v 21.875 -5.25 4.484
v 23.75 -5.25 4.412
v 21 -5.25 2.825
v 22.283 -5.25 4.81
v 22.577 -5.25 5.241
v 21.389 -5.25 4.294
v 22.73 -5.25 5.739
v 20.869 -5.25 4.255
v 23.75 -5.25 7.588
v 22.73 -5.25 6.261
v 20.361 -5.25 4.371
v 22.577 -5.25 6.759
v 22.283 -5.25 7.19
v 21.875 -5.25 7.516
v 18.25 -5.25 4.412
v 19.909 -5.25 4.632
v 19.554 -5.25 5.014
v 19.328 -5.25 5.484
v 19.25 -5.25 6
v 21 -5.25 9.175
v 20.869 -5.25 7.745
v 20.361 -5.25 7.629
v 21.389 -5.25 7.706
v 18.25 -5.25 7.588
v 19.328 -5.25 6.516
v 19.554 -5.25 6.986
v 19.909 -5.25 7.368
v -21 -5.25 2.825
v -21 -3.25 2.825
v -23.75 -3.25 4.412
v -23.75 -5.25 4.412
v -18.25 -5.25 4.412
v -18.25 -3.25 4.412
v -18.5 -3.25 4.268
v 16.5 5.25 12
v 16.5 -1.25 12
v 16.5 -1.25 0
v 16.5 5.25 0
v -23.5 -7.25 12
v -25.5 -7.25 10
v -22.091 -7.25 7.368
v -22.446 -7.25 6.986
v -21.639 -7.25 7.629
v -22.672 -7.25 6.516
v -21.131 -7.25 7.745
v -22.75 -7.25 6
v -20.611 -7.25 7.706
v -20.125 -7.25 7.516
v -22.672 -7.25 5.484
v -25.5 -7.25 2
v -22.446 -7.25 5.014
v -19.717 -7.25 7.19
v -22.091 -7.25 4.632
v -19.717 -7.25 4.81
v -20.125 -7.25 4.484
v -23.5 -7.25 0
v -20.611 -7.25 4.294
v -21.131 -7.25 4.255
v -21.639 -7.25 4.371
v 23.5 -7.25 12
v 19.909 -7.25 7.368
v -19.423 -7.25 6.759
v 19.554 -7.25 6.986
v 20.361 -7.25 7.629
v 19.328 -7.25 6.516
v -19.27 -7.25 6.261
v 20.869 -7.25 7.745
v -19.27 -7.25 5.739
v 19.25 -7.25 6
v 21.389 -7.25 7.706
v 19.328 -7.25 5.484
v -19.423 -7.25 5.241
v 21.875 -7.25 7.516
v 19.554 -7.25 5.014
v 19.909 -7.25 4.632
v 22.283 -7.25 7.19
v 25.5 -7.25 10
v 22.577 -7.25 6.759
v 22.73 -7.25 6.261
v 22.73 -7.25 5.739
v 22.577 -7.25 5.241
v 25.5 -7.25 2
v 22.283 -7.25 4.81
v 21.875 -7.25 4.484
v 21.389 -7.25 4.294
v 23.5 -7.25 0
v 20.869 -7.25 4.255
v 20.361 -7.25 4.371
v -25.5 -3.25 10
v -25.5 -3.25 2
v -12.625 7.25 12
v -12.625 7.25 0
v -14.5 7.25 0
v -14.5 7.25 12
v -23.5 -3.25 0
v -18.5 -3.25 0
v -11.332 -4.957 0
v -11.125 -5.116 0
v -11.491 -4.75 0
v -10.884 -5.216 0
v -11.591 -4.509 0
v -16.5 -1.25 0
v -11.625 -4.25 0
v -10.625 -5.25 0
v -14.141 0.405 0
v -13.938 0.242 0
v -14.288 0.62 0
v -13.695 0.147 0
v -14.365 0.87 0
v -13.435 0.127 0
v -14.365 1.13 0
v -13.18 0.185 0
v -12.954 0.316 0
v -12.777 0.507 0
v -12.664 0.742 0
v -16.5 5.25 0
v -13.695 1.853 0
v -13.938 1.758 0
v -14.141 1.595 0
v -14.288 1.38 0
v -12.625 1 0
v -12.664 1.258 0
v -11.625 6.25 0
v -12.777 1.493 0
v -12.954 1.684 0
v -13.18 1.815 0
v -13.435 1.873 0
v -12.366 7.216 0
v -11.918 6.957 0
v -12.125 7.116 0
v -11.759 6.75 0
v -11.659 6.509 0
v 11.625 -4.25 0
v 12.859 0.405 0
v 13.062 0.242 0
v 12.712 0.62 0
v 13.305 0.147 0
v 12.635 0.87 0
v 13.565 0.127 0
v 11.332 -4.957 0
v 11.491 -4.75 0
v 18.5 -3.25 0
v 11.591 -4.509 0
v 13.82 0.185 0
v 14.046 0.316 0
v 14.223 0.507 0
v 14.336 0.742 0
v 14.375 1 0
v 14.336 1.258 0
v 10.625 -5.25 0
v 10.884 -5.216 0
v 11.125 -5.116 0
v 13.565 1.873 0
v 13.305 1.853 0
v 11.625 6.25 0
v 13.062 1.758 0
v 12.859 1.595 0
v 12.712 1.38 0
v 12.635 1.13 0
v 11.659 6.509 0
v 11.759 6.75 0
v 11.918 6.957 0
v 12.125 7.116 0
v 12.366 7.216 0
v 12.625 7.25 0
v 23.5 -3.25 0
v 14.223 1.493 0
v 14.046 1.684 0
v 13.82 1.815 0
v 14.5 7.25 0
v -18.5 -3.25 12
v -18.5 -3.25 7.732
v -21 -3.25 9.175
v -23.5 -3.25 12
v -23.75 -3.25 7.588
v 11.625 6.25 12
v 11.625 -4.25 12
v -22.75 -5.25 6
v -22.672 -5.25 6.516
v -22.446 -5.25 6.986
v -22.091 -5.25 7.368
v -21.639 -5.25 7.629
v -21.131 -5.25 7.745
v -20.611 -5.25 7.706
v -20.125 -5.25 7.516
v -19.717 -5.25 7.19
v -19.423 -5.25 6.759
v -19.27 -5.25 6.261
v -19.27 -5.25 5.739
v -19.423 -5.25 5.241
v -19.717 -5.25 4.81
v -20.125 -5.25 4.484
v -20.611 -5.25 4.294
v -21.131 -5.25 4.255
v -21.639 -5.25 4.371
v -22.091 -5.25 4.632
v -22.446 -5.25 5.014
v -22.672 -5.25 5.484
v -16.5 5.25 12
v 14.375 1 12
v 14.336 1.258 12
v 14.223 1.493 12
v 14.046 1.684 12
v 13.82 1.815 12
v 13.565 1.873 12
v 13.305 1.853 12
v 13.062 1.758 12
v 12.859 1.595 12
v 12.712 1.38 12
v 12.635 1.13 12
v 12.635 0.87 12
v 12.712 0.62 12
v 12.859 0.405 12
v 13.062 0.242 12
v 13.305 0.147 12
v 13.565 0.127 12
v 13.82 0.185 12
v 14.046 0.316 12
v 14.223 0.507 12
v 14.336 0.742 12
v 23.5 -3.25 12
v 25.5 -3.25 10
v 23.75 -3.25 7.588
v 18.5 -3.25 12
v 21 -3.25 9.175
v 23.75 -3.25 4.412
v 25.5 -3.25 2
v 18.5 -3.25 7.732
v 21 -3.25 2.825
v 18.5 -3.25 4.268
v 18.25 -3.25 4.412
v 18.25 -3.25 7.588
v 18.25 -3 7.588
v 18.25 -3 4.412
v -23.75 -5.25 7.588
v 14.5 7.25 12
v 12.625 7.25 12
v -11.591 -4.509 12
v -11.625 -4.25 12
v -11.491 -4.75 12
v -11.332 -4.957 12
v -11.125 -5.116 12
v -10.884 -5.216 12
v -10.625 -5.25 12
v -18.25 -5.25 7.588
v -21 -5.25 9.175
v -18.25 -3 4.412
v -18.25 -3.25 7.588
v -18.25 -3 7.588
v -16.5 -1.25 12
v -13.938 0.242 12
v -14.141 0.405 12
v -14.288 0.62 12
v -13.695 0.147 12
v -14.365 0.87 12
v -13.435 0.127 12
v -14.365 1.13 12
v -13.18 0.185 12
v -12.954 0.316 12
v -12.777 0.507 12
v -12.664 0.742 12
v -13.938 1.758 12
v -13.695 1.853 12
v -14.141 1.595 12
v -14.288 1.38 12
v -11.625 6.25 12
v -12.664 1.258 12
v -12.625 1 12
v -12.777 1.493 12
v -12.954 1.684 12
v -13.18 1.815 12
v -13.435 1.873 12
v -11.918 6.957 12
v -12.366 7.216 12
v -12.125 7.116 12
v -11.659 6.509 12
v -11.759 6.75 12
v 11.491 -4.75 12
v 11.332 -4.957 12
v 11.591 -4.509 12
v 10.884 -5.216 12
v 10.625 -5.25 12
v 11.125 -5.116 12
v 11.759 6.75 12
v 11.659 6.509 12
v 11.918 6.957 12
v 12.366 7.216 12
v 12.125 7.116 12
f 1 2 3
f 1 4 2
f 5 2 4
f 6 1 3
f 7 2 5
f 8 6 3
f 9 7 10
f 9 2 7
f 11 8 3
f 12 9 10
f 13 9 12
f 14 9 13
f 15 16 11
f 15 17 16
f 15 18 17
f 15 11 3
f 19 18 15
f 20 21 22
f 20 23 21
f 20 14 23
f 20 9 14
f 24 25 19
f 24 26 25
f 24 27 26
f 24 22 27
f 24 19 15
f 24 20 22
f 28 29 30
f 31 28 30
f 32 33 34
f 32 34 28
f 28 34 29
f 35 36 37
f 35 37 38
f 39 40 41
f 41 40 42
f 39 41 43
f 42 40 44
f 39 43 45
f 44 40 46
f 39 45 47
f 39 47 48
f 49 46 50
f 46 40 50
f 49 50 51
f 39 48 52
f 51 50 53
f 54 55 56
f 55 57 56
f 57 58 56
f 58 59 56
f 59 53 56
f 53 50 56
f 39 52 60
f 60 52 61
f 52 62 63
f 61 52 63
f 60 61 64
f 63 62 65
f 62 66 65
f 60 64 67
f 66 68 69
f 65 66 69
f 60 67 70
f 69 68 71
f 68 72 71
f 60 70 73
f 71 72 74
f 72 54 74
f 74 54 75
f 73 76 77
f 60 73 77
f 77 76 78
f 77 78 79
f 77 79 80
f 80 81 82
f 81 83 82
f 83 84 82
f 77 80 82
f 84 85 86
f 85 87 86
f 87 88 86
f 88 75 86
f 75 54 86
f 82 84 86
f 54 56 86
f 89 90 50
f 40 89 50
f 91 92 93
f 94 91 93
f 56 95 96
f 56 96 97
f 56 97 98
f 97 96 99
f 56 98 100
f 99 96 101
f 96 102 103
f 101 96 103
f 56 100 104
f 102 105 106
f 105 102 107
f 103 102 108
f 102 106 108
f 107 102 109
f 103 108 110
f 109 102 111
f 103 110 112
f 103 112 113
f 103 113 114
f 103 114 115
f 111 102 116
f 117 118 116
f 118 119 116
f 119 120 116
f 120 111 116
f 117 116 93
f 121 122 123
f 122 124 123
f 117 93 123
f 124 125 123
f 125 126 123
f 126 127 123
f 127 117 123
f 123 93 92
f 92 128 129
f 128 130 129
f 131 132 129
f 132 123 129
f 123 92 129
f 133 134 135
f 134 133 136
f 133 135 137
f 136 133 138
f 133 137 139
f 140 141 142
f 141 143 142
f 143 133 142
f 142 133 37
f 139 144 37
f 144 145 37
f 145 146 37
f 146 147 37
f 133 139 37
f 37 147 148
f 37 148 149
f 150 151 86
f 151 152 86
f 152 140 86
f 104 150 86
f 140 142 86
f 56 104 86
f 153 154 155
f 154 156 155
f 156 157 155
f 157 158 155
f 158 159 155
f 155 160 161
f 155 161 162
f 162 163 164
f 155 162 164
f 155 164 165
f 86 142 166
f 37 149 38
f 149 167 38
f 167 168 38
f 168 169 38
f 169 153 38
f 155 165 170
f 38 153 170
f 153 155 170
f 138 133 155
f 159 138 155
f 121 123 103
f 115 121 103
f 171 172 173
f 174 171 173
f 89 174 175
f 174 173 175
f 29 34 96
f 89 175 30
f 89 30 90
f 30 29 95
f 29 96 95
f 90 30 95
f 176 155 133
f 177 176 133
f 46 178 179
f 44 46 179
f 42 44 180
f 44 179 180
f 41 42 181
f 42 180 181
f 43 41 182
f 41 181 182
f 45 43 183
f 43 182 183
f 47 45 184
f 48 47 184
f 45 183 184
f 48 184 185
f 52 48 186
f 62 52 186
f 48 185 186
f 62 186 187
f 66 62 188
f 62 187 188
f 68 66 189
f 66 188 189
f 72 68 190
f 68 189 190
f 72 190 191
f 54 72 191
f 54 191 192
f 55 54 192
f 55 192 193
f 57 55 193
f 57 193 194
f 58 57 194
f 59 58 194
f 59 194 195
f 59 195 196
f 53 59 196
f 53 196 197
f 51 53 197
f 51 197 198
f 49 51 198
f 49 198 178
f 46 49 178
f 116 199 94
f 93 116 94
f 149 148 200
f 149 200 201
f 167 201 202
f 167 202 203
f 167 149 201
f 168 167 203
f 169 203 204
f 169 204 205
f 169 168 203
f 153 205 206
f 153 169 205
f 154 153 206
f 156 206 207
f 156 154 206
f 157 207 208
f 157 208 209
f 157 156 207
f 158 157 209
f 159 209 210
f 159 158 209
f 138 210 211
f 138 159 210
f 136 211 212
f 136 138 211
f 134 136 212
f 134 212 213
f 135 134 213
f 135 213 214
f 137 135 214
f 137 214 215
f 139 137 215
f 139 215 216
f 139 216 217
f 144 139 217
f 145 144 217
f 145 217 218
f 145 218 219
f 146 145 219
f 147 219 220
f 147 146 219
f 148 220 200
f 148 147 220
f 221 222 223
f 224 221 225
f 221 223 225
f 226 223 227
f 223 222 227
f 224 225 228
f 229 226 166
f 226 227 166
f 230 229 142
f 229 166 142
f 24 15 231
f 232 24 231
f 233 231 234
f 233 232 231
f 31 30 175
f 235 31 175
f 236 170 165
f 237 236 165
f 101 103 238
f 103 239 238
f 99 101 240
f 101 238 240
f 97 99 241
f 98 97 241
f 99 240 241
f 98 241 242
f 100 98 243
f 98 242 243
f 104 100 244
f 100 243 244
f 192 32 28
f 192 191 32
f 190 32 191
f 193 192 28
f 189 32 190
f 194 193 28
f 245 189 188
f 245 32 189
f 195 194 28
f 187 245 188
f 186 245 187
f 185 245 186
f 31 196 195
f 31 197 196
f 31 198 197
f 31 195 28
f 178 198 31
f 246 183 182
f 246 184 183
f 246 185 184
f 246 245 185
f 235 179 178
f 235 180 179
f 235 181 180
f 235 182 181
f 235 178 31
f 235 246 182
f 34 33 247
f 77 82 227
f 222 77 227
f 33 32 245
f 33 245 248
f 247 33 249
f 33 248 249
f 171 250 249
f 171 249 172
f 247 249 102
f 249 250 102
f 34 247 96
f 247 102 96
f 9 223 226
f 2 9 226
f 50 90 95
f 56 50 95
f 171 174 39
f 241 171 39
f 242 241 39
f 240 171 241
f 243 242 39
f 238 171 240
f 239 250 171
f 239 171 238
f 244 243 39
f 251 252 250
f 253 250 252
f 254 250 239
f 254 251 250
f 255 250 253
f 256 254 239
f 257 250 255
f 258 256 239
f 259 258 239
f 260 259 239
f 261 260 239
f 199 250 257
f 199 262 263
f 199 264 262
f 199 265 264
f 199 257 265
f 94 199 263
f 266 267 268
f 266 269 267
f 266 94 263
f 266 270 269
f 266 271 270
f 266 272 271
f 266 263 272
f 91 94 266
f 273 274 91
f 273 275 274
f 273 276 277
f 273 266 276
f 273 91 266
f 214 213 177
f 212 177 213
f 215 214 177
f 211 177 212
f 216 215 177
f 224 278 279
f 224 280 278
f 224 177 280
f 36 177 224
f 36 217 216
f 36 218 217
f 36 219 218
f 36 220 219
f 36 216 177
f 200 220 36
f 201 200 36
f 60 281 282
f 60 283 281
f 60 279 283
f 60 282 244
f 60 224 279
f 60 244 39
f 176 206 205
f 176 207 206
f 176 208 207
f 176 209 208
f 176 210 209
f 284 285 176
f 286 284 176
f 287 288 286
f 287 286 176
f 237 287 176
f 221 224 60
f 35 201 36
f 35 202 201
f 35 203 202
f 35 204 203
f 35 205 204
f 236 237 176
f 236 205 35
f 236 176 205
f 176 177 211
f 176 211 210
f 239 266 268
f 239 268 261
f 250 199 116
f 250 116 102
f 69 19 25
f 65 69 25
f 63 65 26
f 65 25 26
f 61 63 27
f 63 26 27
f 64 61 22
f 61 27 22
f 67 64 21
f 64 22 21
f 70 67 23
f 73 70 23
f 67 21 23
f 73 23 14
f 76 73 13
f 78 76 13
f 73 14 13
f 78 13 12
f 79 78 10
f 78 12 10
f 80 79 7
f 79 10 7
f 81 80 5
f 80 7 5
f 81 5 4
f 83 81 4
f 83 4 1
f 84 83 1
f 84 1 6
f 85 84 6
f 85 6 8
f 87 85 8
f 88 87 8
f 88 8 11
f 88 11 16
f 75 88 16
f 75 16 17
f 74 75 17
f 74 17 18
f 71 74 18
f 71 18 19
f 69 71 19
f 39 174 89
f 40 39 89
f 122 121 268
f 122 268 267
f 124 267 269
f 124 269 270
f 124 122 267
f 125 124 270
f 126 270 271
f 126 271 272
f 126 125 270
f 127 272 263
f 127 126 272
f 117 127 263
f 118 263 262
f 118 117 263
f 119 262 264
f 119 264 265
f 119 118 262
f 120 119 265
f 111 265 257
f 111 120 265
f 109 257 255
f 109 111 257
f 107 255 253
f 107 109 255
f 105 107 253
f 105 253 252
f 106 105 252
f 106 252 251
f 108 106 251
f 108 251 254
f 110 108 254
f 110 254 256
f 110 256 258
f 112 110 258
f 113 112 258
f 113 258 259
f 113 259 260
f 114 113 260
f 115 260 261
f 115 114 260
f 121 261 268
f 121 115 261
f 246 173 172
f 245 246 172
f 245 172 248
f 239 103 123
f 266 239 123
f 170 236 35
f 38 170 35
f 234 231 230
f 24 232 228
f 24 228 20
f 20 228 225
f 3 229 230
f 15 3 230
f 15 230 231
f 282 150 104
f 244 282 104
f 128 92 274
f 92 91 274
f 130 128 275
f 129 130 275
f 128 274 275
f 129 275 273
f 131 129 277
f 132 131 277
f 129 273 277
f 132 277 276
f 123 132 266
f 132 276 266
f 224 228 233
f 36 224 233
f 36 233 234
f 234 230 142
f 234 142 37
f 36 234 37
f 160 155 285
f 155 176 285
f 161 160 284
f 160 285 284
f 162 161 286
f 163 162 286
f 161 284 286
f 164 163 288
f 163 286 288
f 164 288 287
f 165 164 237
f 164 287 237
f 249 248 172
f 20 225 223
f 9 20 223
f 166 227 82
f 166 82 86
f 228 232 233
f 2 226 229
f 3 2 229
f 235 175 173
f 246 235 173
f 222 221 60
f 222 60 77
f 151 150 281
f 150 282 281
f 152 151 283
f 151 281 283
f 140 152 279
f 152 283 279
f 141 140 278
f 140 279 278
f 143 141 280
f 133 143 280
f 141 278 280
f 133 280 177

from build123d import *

# Parameters (mm, degrees)
F0_R         = 0.875
F1_DEPTH     = 12
F2_R         = 1.75
F3_DEPTH     = 4.001
F4_DEPTH     = 2
F5_T4_DEPTH  = 12
F5_T10_DEPTH = 12
F5_T16_DEPTH = 12
F5_T23_DEPTH = 12
F5_T29_DEPTH = 12
F5_T35_DEPTH = 12
F5_T41_DEPTH = 12
F5_T47_DEPTH = 12
F5_T54_DEPTH = 12
F5_T60_DEPTH = 12
F5_T63_DEPTH = 14.2867319519
F5_T65_DEPTH = 22.2867319519
F6_R         = 1


# Not quite as in the source:
# - a fillet or chamfer that OpenCascade refuses, or shapes differently, is made with other operations: its cross-section is extruded or revolved along the edge and cut away or added


with BuildPart() as f1:
    # F0 (on Top) → F1 (new body)
    with BuildSketch(Plane.XY):
        Polygon((16.5, -5.25), (11.625, -5.25), (-11.625, -5.25), (-16.5, -5.25), (-16.5, -7.25), (16.5, -7.25), align=None)
        Polygon((-11.625, -5.25), (-11.625, 7.25), (-16.5, 7.25), (-16.5, -3.25), (-16.5, -5.25), align=None)
        with Locations((-13.5, 1)):
            Circle(F0_R, mode=Mode.SUBTRACT)
        Polygon((16.5, -3.25), (16.5, 7.25), (11.625, 7.25), (11.625, -5.25), (16.5, -5.25), align=None)
        with Locations((13.5, 1)):
            Circle(F0_R, mode=Mode.SUBTRACT)
        Polygon((25.5, -3.25), (16.5, -3.25), (16.5, -5.25), (16.5, -7.25), (25.5, -7.25), align=None)
        Polygon((-16.5, -5.25), (-16.5, -3.25), (-25.5, -3.25), (-25.5, -7.25), (-16.5, -7.25), align=None)
    extrude(amount=F1_DEPTH)

    # F2 (on face) → F3 (cut, through all)
    with BuildSketch(Plane(origin=(0, -3.25, 0), x_dir=(-1, 0, 0), z_dir=(0, 1, 0))):
        with Locations((-21, 6)):
            Circle(F2_R)
        with Locations((21, 6)):
            Circle(F2_R)
    extrude(amount=-F3_DEPTH, mode=Mode.SUBTRACT)

    # F2 (on face) → F4 (cut)
    with BuildSketch(Plane(origin=(0, -3.25, 0), x_dir=(-1, 0, 0), z_dir=(0, 1, 0))):
        Polygon((-18.25, 4.4122867597), (-18.25, 7.5877132403), (-21, 9.1754264805), (-23.75, 7.5877132403), (-23.75, 4.4122867597), (-21, 2.8245735195), align=None)
        with Locations((-21, 6)):
            Circle(F2_R, mode=Mode.SUBTRACT)
        Polygon((21, 9.1754264805), (18.25, 7.5877132403), (18.25, 4.4122867597), (21, 2.8245735195), (23.75, 4.4122867597), (23.75, 7.5877132403), align=None)
        with Locations((21, 6)):
            Circle(F2_R, mode=Mode.SUBTRACT)
    extrude(amount=-F4_DEPTH, mode=Mode.SUBTRACT)

    # F5: chamfer of 2 on 8 edges, made by hand


with BuildPart() as f5_tool2:
    # F5_s3 → F5_t4 (new body)
    with BuildSketch(Plane.XY):
        Polygon((18.5, -3.25), (16.5, -1.25), (16.5, -3.25), align=None)
    extrude(amount=F5_T4_DEPTH)

    split(bisect_by=Plane.YZ.offset(18.25), keep=Keep.TOP)

    split(bisect_by=Plane(origin=(6.4730762114, 0, 11.2116968793), x_dir=(0, 1, 0), z_dir=(-0.5, 0, -0.8660254038)), keep=Keep.TOP)


with BuildPart() as f1_1:
    add(f1.part)

    # F5_t1: union F5_tool2
    add(f5_tool2.part)


with BuildPart() as f5_tool8:
    # F5_s9 → F5_t10 (new body)
    with BuildSketch(Plane.XY):
        Polygon((18.5, -3.25), (16.5, -1.25), (16.5, -3.25), align=None)
    extrude(amount=F5_T10_DEPTH)

    split(bisect_by=Plane.YZ.offset(18.25), keep=Keep.BOTTOM)

    split(bisect_by=Plane(origin=(6.4730762114, 0, 11.2116968793), x_dir=(0, 1, 0), z_dir=(-0.5, 0, -0.8660254038)), keep=Keep.TOP)


with BuildPart() as f1_2:
    add(f1_1.part)

    # F5_t7: union F5_tool8
    add(f5_tool8.part)


with BuildPart() as f5_tool14:
    # F5_s15 → F5_t16 (new body)
    with BuildSketch(Plane.XY):
        Polygon((18.5, -3.25), (16.5, -1.25), (16.5, -3.25), align=None)
    extrude(amount=F5_T16_DEPTH)

    split(bisect_by=Plane(origin=(1.2769237886, 0, -2.2116968793), x_dir=(0, 1, 0), z_dir=(0.5, 0, -0.8660254038)), keep=Keep.TOP)

    split(bisect_by=Plane.YZ.offset(18.25), keep=Keep.BOTTOM)

    split(bisect_by=Plane(origin=(6.4730762114, 0, 11.2116968793), x_dir=(0, 1, 0), z_dir=(0.5, 0, 0.8660254038)), keep=Keep.TOP)


with BuildPart() as f1_3:
    add(f1_2.part)

    # F5_t13: union F5_tool14
    add(f5_tool14.part)


with BuildPart() as f5_tool21:
    # F5_s22 → F5_t23 (new body)
    with BuildSketch(Plane.XY):
        Polygon((18.5, -3.25), (16.5, -1.25), (16.5, -3.25), align=None)
    extrude(amount=F5_T23_DEPTH)

    split(bisect_by=Plane(origin=(1.2769237886, 0, -2.2116968793), x_dir=(0, 1, 0), z_dir=(-0.5, 0, 0.8660254038)), keep=Keep.TOP)

    split(bisect_by=Plane.YZ.offset(18.25), keep=Keep.TOP)


with BuildPart() as f1_4:
    add(f1_3.part)

    # F5_t20: union F5_tool21
    add(f5_tool21.part)


with BuildPart() as f5_tool27:
    # F5_s28 → F5_t29 (new body)
    with BuildSketch(Plane.XY):
        Polygon((18.5, -3.25), (16.5, -1.25), (16.5, -3.25), align=None)
    extrude(amount=F5_T29_DEPTH)

    split(bisect_by=Plane(origin=(1.2769237886, 0, -2.2116968793), x_dir=(0, 1, 0), z_dir=(-0.5, 0, 0.8660254038)), keep=Keep.TOP)

    split(bisect_by=Plane.YZ.offset(18.25), keep=Keep.BOTTOM)


with BuildPart() as f1_5:
    add(f1_4.part)

    # F5_t26: union F5_tool27
    add(f5_tool27.part)


with BuildPart() as f5_tool33:
    # F5_s34 → F5_t35 (new body)
    with BuildSketch(Plane.XY):
        Polygon((-16.5, -1.25), (-18.5, -3.25), (-16.5, -3.25), align=None)
    extrude(amount=F5_T35_DEPTH)

    split(bisect_by=Plane(origin=(-6.4730762114, 0, 11.2116968793), x_dir=(0, 1, 0), z_dir=(0.5, 0, -0.8660254038)), keep=Keep.TOP)

    split(bisect_by=Plane.YZ.offset(-18.25), keep=Keep.TOP)


with BuildPart() as f1_6:
    add(f1_5.part)

    # F5_t32: union F5_tool33
    add(f5_tool33.part)


with BuildPart() as f5_tool39:
    # F5_s40 → F5_t41 (new body)
    with BuildSketch(Plane.XY):
        Polygon((-16.5, -1.25), (-18.5, -3.25), (-16.5, -3.25), align=None)
    extrude(amount=F5_T41_DEPTH)

    split(bisect_by=Plane(origin=(-6.4730762114, 0, 11.2116968793), x_dir=(0, 1, 0), z_dir=(0.5, 0, -0.8660254038)), keep=Keep.TOP)

    split(bisect_by=Plane.YZ.offset(-18.25), keep=Keep.BOTTOM)


with BuildPart() as f1_7:
    add(f1_6.part)

    # F5_t38: union F5_tool39
    add(f5_tool39.part)


with BuildPart() as f5_tool45:
    # F5_s46 → F5_t47 (new body)
    with BuildSketch(Plane.XY):
        Polygon((-16.5, -1.25), (-18.5, -3.25), (-16.5, -3.25), align=None)
    extrude(amount=F5_T47_DEPTH)

    split(bisect_by=Plane(origin=(-6.4730762114, 0, 11.2116968793), x_dir=(0, 1, 0), z_dir=(-0.5, 0, 0.8660254038)), keep=Keep.TOP)

    split(bisect_by=Plane.YZ.offset(-18.25), keep=Keep.TOP)

    split(bisect_by=Plane(origin=(-1.2769237886, 0, -2.2116968793), x_dir=(0, 1, 0), z_dir=(-0.5, 0, -0.8660254038)), keep=Keep.TOP)


with BuildPart() as f1_8:
    add(f1_7.part)

    # F5_t44: union F5_tool45
    add(f5_tool45.part)


with BuildPart() as f5_tool52:
    # F5_s53 → F5_t54 (new body)
    with BuildSketch(Plane.XY):
        Polygon((-16.5, -1.25), (-18.5, -3.25), (-16.5, -3.25), align=None)
    extrude(amount=F5_T54_DEPTH)

    split(bisect_by=Plane.YZ.offset(-18.25), keep=Keep.TOP)

    split(bisect_by=Plane(origin=(-1.2769237886, 0, -2.2116968793), x_dir=(0, 1, 0), z_dir=(0.5, 0, 0.8660254038)), keep=Keep.TOP)


with BuildPart() as f1_9:
    add(f1_8.part)

    # F5_t51: union F5_tool52
    add(f5_tool52.part)


with BuildPart() as f5_tool58:
    # F5_s59 → F5_t60 (new body)
    with BuildSketch(Plane.XY):
        Polygon((-16.5, -1.25), (-18.5, -3.25), (-16.5, -3.25), align=None)
    extrude(amount=F5_T60_DEPTH)

    split(bisect_by=Plane.YZ.offset(-18.25), keep=Keep.BOTTOM)

    split(bisect_by=Plane(origin=(-1.2769237886, 0, -2.2116968793), x_dir=(0, 1, 0), z_dir=(0.5, 0, 0.8660254038)), keep=Keep.TOP)


with BuildPart() as f1_10:
    add(f1_9.part)

    # F5_t57: union F5_tool58
    add(f5_tool58.part)

    # F5_s64 → F5_t63 (cut)
    with BuildSketch(Plane.XZ.offset(-1.8933659759)):
        Polygon((25.5, 2), (23.5, 0), (25.5, 0), align=None)
        Polygon((23.5, 12), (25.5, 10), (25.5, 12), align=None)
        Polygon((-25.5, 2), (-23.5, 0), (-25.5, 0), align=None)
        Polygon((-23.5, 12), (-25.5, 10), (-25.5, 12), align=None)
    extrude(amount=F5_T63_DEPTH, mode=Mode.SUBTRACT)

    # F5_s66 → F5_t65 (cut)
    with BuildSketch(Plane.XY.offset(-5.1433659759)):
        Polygon((14.5, 7.25), (16.5, 5.25), (16.5, 7.25), align=None)
        Polygon((-16.5, 5.25), (-14.5, 7.25), (-16.5, 7.25), align=None)
    extrude(amount=F5_T65_DEPTH, mode=Mode.SUBTRACT)

    # F6
    f6_edges = [f1_10.edges().sort_by_distance(p)[0] for p in [
        (-11.625, 7.25, 6),
        (11.625, 7.25, 6),
        (11.625, -5.25, 6),
        (-11.625, -5.25, 6),
    ]]
    fillet(f6_edges, radius=F6_R)


solid = f1_10.part
